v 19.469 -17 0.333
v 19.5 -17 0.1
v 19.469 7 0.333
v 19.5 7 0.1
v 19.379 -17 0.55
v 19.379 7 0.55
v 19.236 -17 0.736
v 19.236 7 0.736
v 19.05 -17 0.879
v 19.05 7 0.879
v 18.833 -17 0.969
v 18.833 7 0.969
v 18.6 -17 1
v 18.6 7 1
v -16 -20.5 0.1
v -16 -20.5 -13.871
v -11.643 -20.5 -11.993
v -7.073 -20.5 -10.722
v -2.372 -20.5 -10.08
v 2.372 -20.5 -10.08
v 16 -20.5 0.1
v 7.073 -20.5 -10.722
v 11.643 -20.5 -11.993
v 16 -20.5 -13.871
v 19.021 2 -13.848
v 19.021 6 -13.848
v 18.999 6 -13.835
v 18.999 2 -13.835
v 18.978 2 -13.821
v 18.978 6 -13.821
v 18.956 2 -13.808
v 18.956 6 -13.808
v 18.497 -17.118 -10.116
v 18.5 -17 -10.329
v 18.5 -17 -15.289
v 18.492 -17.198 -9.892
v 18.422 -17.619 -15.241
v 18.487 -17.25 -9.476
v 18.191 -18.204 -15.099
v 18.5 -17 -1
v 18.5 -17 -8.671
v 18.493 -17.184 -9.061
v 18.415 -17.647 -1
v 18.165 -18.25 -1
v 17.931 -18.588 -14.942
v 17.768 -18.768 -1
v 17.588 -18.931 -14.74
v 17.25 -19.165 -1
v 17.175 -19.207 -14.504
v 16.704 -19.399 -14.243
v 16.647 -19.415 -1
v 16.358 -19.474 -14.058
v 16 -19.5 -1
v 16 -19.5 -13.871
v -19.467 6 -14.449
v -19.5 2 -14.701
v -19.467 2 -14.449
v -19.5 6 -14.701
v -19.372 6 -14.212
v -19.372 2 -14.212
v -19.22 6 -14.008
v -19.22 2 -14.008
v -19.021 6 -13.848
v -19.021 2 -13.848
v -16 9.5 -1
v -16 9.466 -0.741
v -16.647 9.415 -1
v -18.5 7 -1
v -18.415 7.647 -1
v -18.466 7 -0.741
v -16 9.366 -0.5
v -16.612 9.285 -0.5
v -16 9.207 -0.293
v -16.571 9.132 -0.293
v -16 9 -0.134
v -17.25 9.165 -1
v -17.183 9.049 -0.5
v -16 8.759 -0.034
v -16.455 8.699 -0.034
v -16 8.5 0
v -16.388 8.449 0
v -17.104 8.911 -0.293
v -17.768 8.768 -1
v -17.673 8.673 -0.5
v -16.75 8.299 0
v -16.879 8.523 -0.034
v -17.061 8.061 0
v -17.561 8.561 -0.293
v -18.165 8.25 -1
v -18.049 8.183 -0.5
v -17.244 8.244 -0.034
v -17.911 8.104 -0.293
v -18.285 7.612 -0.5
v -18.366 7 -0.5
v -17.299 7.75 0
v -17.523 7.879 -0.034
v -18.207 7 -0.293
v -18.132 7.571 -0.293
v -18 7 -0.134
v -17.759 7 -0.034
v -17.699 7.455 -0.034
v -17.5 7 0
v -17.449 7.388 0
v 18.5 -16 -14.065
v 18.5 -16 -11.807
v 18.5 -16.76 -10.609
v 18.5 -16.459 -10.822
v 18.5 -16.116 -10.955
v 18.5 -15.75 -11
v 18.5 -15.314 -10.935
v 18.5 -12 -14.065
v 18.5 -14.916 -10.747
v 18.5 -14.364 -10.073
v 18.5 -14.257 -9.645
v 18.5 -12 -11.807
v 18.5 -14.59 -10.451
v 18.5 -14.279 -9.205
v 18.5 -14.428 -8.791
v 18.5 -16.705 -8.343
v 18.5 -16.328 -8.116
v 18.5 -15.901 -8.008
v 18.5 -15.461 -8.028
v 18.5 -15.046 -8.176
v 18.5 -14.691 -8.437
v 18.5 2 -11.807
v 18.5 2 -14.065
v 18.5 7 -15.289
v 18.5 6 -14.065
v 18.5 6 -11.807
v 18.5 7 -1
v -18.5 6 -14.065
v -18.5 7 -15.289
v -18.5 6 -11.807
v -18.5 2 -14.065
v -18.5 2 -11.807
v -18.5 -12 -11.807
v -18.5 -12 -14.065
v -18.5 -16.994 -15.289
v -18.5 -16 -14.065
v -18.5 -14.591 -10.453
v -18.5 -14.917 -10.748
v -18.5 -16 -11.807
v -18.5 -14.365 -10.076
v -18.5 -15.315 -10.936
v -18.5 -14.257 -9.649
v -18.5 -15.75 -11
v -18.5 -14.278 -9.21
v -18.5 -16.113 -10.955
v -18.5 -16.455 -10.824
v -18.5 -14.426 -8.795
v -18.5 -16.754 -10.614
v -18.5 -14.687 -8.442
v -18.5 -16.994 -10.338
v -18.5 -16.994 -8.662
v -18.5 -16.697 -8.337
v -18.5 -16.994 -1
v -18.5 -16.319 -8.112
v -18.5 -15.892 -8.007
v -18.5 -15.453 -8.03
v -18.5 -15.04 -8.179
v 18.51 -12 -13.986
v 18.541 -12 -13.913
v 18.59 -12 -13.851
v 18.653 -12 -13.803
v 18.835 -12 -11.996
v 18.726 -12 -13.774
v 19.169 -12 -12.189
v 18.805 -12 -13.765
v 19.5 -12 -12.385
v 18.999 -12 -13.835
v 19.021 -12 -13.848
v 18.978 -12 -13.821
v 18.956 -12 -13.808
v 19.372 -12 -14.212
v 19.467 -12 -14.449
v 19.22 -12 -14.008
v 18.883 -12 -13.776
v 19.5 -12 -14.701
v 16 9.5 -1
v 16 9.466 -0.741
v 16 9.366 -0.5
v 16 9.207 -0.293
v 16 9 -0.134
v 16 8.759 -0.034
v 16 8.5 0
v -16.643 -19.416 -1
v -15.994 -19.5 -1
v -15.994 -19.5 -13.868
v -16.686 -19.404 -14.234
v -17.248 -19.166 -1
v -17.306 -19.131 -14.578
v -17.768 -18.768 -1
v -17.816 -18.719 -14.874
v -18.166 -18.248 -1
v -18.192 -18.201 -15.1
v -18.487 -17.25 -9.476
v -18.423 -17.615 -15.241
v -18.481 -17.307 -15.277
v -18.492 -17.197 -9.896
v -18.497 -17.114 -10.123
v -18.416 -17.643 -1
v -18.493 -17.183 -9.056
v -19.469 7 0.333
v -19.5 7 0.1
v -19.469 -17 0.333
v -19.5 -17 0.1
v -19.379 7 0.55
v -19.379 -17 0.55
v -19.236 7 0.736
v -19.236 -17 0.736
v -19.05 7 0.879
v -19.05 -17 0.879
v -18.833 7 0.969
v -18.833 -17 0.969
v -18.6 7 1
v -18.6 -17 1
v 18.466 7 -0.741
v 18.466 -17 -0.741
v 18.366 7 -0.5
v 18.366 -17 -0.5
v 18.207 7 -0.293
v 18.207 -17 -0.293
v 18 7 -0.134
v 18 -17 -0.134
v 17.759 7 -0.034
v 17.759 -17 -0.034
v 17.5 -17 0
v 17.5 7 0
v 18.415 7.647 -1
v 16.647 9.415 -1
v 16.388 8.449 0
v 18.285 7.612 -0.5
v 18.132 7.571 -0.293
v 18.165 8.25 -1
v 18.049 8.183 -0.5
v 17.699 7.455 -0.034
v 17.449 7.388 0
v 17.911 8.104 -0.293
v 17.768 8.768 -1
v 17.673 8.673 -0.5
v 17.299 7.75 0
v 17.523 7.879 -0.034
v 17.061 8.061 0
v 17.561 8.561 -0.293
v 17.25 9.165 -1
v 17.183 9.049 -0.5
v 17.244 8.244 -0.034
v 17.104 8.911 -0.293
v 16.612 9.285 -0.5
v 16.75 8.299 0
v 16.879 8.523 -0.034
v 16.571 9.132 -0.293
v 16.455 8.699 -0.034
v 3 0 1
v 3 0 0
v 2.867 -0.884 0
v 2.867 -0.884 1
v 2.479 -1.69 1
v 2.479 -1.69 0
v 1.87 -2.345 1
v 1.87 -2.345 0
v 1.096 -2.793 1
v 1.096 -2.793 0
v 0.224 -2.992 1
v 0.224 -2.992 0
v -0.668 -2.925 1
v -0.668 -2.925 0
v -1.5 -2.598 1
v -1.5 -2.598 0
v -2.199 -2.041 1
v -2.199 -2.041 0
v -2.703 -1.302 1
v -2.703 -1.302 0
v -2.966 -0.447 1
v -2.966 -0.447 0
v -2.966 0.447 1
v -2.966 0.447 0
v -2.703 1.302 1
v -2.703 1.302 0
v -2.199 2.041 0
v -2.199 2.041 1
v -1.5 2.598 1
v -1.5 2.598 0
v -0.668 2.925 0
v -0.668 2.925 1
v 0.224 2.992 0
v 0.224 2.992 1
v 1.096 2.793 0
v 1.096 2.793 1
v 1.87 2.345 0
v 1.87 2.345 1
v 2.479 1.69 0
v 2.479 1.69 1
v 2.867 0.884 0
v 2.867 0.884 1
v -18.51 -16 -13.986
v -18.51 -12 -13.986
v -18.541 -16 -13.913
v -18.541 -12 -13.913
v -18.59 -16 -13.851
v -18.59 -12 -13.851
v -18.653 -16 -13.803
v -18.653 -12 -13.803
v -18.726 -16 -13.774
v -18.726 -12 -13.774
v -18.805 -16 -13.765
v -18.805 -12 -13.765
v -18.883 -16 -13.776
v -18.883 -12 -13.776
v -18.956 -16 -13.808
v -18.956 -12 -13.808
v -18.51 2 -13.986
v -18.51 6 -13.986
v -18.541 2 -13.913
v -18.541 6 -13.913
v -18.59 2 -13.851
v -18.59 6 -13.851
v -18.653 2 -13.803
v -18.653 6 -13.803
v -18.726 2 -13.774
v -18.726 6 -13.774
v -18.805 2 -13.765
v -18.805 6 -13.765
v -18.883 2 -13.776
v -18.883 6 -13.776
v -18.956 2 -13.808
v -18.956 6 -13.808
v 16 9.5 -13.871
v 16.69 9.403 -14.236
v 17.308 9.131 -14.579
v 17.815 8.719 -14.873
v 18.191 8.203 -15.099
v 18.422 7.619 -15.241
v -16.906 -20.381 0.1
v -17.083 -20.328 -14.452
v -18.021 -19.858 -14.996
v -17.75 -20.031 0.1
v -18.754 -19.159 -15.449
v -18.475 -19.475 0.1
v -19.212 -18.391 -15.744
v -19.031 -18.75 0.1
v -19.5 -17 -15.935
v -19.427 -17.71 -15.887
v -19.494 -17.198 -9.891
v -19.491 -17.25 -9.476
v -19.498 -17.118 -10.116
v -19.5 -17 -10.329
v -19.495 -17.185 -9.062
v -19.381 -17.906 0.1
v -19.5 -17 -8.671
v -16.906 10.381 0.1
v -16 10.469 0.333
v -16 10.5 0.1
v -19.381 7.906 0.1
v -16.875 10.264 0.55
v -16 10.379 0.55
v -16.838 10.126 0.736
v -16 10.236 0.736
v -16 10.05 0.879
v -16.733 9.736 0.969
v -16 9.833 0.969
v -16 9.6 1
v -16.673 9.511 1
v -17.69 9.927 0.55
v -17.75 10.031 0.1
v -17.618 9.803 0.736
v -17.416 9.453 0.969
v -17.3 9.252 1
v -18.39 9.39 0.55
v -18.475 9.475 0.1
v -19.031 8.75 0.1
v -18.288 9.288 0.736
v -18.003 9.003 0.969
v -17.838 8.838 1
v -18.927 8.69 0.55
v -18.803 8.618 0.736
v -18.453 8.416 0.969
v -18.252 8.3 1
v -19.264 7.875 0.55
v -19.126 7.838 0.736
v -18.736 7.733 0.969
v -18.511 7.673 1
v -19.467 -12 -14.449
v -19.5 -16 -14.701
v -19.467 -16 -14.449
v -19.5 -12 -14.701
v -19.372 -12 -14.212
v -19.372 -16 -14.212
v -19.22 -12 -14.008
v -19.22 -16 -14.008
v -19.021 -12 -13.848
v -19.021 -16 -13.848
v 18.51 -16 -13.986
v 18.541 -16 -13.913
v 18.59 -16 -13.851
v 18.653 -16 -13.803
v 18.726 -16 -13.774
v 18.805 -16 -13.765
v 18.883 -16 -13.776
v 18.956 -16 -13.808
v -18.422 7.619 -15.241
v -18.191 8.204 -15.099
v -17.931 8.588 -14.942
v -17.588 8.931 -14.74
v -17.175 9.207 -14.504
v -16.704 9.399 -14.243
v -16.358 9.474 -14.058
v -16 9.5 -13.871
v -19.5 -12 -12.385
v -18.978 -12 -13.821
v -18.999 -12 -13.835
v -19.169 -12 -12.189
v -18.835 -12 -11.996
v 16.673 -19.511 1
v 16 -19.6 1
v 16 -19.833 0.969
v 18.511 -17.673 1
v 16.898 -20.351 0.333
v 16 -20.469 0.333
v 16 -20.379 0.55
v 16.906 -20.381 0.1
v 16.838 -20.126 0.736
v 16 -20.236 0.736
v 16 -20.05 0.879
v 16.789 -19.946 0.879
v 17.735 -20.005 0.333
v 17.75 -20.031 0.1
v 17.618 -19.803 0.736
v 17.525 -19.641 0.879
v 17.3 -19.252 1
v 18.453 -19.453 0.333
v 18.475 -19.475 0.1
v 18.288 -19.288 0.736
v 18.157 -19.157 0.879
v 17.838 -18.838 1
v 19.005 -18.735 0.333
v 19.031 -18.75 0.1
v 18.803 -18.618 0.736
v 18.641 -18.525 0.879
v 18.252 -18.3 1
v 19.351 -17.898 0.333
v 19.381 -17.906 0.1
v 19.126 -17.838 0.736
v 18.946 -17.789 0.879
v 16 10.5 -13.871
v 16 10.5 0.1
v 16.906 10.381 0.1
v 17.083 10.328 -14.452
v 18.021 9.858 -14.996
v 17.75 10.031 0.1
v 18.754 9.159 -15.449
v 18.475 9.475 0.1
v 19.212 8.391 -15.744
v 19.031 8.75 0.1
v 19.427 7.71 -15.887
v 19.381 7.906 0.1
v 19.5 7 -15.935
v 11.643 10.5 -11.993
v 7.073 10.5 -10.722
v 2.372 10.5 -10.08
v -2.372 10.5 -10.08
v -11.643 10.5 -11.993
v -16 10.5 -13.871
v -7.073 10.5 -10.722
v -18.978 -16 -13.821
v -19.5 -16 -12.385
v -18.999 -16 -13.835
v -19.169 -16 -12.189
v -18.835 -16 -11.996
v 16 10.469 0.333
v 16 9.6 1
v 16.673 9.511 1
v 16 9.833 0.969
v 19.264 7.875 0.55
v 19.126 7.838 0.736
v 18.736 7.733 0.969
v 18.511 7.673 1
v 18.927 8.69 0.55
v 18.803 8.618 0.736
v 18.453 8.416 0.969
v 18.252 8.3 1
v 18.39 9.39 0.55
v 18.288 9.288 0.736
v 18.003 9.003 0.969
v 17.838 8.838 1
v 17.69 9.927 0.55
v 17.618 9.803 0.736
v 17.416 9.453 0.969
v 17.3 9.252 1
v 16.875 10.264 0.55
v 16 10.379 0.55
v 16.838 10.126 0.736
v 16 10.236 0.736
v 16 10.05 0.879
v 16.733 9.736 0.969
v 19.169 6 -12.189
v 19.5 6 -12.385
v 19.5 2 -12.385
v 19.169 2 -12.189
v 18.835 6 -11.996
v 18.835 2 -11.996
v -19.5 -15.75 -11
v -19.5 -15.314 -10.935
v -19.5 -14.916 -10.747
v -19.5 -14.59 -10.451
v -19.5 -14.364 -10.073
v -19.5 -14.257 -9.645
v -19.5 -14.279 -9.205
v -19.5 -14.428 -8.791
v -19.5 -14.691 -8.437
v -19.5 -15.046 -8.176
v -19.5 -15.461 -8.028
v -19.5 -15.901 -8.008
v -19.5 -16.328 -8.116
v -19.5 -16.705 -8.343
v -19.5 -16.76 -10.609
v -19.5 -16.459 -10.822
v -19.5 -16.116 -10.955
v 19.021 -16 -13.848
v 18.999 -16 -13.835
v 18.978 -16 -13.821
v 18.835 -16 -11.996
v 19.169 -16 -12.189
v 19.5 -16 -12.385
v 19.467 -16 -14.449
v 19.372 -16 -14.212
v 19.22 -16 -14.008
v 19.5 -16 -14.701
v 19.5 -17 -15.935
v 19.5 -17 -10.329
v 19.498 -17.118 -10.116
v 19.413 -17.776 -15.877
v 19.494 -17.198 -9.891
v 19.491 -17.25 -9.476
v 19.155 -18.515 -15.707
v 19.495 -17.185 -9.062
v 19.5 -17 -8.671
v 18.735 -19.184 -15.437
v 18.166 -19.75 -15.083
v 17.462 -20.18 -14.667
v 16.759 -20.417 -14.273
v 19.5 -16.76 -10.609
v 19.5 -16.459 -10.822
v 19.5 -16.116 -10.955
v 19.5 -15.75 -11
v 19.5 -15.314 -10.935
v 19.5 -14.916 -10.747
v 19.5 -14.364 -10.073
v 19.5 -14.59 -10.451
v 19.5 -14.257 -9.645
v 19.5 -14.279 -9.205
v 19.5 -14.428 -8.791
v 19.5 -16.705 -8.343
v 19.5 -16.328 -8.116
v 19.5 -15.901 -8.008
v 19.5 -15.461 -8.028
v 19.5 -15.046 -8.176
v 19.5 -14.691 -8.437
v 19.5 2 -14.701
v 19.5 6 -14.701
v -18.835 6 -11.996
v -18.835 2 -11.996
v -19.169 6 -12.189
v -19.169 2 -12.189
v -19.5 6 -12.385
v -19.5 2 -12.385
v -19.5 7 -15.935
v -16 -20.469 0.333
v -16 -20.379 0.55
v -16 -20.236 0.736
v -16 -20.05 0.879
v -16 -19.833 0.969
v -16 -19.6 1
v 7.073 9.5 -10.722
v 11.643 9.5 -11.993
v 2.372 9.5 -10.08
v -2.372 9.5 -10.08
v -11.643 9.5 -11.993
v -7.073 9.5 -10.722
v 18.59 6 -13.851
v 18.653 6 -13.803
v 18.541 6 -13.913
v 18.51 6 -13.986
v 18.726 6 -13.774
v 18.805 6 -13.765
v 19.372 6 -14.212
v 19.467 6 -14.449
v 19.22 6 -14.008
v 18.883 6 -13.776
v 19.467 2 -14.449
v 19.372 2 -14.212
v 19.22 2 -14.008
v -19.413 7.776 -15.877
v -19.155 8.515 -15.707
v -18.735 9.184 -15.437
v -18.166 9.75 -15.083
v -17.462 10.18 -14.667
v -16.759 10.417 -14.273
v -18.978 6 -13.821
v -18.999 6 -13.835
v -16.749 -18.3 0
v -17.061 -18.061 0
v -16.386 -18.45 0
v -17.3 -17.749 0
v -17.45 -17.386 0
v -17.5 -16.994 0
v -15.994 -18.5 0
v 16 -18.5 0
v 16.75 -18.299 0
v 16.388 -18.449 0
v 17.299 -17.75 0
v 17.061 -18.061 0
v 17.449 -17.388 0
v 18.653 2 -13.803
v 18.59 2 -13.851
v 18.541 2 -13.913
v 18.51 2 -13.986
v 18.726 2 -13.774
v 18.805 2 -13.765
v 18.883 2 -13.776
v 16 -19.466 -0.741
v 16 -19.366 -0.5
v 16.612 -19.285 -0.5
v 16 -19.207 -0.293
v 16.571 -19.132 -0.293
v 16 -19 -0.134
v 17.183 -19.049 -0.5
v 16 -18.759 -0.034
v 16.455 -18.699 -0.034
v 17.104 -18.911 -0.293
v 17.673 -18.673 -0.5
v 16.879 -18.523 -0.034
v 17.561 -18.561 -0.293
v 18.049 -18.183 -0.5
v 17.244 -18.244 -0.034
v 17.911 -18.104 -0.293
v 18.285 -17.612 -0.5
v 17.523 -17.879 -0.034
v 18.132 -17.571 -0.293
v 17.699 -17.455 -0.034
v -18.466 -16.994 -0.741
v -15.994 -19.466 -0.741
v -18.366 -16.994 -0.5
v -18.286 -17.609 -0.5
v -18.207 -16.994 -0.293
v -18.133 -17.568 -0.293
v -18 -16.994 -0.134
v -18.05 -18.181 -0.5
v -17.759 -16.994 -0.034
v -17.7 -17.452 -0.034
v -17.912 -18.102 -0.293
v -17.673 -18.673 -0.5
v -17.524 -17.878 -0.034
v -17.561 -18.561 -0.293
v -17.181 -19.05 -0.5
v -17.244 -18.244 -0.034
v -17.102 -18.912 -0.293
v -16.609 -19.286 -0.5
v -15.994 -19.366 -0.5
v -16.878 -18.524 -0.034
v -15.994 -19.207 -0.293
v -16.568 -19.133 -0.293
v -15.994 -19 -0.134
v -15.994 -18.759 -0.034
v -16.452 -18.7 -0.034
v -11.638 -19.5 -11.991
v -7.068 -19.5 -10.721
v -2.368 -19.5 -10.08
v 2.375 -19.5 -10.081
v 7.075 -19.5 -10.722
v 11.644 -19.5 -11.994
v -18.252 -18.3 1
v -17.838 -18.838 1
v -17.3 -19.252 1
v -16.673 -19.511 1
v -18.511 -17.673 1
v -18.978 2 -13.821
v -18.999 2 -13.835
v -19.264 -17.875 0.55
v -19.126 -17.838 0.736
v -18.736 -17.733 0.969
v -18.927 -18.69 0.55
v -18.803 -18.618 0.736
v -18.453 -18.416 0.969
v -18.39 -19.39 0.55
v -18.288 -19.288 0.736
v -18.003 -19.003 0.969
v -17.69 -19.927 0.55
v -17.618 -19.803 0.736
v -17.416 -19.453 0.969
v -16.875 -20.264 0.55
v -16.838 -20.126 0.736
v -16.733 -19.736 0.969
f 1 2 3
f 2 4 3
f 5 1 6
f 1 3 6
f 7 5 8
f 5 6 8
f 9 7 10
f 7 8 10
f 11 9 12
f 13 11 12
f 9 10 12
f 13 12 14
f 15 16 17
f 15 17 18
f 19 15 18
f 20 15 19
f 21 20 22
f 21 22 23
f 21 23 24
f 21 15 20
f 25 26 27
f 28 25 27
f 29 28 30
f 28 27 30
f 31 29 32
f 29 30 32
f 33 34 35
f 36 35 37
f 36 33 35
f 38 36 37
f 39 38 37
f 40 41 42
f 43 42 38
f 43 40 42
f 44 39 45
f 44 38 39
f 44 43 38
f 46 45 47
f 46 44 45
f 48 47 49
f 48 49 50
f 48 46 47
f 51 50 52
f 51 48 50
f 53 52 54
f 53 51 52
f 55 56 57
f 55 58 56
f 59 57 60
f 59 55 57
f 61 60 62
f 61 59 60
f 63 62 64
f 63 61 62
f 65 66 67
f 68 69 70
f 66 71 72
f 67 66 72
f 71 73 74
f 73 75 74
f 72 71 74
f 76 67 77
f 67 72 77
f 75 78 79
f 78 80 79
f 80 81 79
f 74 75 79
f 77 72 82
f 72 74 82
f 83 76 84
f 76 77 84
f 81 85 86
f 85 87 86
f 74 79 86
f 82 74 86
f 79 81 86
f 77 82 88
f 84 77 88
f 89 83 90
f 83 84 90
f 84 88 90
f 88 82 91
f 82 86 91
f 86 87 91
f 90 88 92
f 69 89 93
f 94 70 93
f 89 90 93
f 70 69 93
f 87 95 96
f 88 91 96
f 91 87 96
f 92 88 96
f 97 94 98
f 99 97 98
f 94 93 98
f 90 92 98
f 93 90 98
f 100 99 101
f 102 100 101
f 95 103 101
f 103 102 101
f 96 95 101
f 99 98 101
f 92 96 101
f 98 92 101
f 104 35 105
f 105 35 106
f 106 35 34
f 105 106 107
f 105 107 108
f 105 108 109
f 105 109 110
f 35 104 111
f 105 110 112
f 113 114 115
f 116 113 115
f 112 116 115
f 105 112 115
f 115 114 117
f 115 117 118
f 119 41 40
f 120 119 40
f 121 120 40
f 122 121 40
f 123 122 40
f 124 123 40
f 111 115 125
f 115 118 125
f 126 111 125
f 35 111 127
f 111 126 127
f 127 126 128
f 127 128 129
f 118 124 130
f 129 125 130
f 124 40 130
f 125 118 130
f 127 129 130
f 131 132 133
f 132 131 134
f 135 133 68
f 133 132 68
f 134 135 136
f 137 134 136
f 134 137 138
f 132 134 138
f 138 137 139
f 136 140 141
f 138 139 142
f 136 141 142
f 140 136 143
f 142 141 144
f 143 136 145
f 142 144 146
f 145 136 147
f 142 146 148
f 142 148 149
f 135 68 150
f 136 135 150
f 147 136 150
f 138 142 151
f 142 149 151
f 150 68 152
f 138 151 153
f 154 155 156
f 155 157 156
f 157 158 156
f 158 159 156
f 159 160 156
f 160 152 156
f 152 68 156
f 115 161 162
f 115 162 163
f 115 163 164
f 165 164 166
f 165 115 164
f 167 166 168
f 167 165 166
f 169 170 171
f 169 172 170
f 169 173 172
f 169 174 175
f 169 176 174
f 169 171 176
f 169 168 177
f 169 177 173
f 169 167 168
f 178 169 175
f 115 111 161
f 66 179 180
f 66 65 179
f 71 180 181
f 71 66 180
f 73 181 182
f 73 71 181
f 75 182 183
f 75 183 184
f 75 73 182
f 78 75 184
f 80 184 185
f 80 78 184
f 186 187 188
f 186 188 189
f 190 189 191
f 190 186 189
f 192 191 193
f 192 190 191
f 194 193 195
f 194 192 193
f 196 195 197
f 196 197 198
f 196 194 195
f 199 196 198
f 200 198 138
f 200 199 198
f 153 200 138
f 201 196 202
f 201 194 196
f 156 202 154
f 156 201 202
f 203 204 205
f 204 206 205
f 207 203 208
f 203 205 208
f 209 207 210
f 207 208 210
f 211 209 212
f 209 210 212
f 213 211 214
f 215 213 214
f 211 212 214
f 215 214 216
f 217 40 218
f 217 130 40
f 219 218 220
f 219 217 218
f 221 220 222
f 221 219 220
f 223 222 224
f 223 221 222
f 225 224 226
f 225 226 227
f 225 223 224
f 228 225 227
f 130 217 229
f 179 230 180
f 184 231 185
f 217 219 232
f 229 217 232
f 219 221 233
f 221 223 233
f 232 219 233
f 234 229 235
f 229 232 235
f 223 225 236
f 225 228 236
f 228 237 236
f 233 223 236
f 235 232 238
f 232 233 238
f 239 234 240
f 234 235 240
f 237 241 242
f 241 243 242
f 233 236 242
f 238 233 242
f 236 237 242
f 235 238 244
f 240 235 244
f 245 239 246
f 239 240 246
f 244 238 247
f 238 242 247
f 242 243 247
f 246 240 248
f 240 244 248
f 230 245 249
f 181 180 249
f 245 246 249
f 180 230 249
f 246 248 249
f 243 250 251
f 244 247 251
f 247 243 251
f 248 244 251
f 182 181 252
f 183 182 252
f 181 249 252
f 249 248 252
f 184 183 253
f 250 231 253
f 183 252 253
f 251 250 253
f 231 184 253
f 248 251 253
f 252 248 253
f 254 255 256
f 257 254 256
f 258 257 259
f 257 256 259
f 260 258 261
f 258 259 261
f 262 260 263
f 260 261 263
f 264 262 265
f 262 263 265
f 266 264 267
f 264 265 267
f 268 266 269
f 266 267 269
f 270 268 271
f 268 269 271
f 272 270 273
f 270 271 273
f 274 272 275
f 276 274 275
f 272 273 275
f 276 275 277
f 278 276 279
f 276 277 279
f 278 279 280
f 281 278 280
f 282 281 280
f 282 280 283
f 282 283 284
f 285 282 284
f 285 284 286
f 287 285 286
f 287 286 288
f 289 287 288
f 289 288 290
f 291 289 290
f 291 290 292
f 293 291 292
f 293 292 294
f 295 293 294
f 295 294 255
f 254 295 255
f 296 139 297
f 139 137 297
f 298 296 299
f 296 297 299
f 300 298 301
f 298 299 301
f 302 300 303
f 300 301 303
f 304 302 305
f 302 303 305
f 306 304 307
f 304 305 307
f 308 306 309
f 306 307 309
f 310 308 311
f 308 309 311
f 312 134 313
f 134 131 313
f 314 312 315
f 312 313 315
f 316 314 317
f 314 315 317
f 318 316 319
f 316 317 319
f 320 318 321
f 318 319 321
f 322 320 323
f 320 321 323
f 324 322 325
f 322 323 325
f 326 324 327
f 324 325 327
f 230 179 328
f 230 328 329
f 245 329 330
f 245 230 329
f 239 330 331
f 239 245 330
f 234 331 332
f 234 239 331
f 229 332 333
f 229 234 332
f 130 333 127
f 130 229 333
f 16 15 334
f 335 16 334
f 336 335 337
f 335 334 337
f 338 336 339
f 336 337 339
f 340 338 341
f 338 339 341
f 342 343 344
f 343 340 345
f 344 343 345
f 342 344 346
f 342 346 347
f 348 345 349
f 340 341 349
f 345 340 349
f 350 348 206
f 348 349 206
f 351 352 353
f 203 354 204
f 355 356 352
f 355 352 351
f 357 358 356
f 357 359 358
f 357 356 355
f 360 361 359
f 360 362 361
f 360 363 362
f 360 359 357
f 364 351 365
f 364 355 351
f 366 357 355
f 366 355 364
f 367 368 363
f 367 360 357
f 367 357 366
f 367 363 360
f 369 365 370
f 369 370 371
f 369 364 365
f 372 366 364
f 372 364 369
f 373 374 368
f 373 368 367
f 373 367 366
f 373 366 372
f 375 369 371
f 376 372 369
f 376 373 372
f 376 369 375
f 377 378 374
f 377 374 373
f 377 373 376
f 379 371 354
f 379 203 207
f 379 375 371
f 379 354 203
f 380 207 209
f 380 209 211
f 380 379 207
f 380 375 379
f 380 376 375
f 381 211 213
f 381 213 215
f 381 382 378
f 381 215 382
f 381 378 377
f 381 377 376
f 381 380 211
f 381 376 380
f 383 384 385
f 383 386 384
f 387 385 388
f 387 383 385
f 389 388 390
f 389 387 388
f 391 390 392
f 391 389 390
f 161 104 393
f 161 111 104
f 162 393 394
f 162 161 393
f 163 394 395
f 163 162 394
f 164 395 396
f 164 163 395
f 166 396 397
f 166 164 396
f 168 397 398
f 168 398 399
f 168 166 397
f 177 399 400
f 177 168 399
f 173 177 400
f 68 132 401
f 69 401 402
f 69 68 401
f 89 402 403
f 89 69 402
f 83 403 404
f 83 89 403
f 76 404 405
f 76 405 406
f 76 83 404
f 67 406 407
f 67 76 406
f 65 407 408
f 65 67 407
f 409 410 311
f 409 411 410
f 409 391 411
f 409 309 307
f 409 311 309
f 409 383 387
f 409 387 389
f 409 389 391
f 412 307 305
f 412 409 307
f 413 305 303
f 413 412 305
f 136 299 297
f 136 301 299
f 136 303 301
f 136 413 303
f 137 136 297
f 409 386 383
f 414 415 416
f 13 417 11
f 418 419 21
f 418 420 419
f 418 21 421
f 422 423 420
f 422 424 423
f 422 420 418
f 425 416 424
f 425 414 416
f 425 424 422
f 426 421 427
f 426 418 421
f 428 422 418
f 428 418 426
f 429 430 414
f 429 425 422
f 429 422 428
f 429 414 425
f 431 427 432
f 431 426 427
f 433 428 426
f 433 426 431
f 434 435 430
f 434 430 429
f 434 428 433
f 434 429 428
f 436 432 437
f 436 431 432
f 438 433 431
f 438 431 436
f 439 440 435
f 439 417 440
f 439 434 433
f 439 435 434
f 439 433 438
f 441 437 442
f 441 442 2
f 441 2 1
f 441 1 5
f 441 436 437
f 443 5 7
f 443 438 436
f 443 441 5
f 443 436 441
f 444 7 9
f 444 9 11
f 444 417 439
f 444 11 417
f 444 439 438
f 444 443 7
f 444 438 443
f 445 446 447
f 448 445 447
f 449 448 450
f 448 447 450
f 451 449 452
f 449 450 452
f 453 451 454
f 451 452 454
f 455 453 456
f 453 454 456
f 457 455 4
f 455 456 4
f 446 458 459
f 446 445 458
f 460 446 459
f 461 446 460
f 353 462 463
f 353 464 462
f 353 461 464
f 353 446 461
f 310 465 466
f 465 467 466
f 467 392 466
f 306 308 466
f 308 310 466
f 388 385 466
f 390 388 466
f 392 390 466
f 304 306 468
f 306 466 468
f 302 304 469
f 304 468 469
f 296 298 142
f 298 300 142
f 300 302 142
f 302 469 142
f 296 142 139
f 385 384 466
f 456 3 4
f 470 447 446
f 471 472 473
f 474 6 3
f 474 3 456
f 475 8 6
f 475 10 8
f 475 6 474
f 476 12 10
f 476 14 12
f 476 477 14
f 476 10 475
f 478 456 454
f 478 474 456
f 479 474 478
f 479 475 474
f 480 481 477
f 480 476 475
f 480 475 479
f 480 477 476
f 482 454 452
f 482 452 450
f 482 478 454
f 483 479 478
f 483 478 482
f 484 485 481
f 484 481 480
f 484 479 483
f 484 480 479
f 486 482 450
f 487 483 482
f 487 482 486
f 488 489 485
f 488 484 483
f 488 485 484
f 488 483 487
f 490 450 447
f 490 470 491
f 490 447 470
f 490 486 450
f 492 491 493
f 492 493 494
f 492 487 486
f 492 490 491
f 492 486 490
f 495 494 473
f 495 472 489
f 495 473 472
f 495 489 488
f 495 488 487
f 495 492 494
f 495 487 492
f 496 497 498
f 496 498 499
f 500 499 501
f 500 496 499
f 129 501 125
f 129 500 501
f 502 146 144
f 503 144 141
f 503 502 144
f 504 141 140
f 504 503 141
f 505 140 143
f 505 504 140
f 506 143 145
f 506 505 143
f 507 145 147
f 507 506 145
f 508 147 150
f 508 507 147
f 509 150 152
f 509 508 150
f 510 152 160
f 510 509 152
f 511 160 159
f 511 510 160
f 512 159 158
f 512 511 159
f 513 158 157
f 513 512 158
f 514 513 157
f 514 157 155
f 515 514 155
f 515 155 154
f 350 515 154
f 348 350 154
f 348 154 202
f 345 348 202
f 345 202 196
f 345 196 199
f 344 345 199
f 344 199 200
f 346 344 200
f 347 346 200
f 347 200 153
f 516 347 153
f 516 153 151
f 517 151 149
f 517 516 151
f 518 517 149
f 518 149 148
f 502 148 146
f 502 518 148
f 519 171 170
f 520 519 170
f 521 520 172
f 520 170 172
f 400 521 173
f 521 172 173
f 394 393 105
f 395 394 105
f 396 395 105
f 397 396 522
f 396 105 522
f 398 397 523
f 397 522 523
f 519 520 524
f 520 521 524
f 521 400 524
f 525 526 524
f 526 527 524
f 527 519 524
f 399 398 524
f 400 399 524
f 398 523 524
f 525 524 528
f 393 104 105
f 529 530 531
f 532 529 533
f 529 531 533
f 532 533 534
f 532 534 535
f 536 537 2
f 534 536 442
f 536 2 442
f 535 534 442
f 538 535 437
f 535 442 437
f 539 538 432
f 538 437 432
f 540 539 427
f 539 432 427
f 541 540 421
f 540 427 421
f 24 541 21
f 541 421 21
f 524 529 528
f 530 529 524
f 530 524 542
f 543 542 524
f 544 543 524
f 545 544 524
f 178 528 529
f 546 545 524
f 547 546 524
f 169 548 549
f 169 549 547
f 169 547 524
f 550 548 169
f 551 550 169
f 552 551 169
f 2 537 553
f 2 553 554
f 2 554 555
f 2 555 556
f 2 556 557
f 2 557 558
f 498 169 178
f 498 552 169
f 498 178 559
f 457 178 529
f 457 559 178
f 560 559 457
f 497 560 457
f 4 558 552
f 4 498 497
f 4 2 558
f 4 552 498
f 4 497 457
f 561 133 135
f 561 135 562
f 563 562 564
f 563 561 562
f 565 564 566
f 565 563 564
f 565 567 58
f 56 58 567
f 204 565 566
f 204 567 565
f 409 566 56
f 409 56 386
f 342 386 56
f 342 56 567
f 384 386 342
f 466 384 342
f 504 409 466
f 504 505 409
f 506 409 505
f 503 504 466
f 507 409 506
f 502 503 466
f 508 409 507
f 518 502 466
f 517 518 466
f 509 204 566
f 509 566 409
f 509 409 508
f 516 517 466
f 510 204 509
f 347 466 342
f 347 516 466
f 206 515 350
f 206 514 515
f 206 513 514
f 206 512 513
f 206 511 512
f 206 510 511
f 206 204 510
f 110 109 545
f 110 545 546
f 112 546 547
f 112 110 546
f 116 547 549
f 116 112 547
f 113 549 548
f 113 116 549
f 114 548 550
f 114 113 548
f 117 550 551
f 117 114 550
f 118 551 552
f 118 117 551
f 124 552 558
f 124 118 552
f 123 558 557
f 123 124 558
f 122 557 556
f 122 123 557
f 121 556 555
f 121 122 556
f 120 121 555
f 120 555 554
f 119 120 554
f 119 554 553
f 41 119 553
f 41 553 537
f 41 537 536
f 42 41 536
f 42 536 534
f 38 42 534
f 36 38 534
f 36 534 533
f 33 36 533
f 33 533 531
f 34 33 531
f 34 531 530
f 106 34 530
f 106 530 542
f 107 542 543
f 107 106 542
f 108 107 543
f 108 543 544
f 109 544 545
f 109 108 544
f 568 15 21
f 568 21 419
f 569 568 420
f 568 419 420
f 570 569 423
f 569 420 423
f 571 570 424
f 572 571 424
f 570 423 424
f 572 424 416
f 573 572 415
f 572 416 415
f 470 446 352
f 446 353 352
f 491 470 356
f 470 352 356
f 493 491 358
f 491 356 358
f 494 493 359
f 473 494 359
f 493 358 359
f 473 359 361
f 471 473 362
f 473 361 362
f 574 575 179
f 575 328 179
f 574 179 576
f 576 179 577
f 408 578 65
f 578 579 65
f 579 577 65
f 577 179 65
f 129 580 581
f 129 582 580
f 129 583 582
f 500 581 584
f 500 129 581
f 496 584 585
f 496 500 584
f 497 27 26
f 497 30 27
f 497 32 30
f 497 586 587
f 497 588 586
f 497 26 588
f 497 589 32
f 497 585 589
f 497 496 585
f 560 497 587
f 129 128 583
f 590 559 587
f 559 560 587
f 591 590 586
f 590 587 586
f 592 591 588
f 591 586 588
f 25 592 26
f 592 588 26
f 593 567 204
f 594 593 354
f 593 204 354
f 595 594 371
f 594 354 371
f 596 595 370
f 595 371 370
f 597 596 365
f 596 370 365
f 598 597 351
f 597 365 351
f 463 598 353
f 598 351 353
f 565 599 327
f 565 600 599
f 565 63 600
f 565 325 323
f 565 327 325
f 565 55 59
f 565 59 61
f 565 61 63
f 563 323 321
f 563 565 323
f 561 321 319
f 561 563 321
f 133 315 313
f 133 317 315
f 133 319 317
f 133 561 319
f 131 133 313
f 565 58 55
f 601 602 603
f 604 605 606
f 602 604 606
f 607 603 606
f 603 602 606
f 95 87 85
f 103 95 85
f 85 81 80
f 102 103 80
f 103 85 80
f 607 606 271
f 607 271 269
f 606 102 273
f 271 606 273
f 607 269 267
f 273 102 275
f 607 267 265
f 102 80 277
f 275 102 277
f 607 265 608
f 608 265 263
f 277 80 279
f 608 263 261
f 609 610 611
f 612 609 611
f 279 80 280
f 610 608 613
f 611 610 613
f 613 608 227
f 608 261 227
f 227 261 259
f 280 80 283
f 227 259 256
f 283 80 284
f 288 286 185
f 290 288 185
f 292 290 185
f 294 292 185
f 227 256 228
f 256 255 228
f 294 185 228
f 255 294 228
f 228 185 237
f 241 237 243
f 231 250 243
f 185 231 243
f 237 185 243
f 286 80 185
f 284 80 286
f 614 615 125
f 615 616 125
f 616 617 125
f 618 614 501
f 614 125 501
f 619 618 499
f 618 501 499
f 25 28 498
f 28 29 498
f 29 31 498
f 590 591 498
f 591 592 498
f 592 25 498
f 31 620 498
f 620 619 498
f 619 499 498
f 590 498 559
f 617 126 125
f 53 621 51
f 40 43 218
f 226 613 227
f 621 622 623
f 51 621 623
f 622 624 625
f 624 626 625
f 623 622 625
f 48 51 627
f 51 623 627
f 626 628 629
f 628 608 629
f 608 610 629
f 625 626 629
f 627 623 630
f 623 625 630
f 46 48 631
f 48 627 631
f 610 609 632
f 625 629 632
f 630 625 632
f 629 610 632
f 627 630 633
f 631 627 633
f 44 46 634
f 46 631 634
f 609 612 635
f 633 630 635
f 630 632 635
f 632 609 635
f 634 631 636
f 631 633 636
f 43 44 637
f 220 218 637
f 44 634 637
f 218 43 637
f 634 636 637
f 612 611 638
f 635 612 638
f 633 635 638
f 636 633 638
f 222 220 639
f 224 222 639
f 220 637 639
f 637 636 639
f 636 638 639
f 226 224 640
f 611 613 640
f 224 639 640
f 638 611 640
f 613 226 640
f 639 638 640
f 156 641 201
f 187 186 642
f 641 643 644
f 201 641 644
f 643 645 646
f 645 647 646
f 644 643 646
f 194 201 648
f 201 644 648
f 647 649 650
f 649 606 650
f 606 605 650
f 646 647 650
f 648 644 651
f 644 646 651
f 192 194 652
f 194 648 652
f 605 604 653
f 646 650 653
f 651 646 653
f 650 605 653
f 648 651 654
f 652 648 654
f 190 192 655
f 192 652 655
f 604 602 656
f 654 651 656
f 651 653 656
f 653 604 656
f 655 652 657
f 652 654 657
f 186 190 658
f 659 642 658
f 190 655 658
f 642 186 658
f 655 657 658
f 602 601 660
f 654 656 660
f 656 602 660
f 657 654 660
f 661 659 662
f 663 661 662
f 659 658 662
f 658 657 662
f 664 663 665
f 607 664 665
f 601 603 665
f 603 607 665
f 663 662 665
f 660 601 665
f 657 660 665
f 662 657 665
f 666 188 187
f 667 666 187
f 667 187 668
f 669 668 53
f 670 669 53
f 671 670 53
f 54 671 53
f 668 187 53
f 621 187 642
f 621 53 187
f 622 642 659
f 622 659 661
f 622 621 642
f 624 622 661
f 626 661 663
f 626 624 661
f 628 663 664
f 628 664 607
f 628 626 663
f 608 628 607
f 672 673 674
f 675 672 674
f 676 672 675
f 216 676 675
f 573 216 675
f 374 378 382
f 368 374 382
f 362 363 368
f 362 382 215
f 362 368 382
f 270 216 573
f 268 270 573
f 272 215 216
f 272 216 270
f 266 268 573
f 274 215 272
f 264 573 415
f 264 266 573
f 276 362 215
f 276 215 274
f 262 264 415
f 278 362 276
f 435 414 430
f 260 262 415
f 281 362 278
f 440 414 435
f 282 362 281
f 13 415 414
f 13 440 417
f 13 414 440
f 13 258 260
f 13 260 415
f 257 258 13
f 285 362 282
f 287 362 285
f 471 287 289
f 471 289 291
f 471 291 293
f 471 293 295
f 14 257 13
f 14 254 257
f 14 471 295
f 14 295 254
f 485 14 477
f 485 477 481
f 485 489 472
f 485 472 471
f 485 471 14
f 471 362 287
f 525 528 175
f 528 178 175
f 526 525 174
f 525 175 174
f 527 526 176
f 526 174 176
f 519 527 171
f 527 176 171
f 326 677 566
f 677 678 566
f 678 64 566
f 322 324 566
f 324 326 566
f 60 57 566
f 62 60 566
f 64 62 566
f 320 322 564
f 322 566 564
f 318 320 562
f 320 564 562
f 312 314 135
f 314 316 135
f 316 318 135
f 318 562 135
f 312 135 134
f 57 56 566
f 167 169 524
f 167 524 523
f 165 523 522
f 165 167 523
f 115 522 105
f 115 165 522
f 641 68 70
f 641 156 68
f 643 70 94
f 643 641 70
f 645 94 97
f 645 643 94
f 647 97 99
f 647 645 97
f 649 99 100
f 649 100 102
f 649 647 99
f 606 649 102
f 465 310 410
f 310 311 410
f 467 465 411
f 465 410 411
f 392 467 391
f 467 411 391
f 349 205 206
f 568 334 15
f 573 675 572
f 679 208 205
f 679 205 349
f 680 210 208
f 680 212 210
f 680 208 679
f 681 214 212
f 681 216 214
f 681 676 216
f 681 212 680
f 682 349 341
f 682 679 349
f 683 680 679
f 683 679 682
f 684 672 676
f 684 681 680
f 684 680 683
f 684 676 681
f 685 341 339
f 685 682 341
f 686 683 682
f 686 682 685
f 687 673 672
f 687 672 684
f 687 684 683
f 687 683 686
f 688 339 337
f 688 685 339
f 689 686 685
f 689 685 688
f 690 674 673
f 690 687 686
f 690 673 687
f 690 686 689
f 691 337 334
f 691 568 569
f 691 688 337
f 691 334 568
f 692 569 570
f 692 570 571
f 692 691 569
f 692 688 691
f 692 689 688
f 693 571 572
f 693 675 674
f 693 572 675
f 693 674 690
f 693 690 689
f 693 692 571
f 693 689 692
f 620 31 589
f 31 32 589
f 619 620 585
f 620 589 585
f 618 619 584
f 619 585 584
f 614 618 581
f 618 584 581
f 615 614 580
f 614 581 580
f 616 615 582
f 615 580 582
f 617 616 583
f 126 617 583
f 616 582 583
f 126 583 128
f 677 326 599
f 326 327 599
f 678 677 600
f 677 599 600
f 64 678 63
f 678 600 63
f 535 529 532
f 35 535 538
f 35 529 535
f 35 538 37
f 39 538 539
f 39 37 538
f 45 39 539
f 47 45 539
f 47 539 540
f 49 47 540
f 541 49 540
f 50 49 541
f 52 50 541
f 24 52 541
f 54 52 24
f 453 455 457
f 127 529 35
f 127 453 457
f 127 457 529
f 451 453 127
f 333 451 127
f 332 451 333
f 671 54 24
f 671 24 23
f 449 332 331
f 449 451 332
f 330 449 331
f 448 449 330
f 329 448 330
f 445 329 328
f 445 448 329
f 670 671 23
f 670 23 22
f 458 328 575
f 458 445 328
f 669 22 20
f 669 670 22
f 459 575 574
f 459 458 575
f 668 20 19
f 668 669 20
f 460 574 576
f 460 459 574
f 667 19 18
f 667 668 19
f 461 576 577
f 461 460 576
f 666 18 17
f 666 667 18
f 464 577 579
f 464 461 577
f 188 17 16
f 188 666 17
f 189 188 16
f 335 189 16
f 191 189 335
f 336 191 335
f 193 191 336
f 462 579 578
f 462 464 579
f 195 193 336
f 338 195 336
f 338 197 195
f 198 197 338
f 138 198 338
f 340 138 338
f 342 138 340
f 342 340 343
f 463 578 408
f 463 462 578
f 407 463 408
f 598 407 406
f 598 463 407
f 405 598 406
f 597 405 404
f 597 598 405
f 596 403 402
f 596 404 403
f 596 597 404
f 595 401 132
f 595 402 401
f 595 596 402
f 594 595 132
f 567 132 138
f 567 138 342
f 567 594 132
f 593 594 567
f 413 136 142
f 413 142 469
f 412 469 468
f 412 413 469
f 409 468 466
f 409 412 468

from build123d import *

# Parameters (mm, degrees)
CYLINDER004_R     = 36.5
CYLINDER004_DEPTH = 4
CYLINDER005_R     = 38
CYLINDER005_DEPTH = 4
CYLINDER003_R     = 36.5
CYLINDER003_DEPTH = 4
CYLINDER002_R     = 38
CYLINDER002_DEPTH = 4
CYLINDER001_R     = 1.5
CYLINDER001_DEPTH = 40
CYLINDER_R        = 35
CYLINDER_DEPTH    = 35
PAD_DEPTH         = 1
SKETCH001_R       = 3
HOLE_DEPTH        = 25
PAD001_DEPTH      = 18
FILLET_1_R        = 1
FILLET_2_R        = 0.9
FILLET001_R       = 1
FILLET002_R       = 0.3


with BuildPart() as cylinder004:
    # Cylinder004 → Cylinder004 (new body)
    with BuildSketch(Plane(origin=(0, 0, -45), x_dir=(1, 0, 0), z_dir=(0, -1, 0))):
        Circle(CYLINDER004_R)
    extrude(amount=CYLINDER004_DEPTH)


with BuildPart() as cut003:
    # Cylinder005 → Cylinder005 (new body)
    with BuildSketch(Plane(origin=(0, 0, -45), x_dir=(1, 0, 0), z_dir=(0, -1, 0))):
        Circle(CYLINDER005_R)
    extrude(amount=CYLINDER005_DEPTH)

    # Cut003: cut Cylinder004
    add(cylinder004.part, mode=Mode.SUBTRACT)


with BuildPart() as cut003_1:
    # Cut003 placement: moved
    add(cut003.part.moved(Location((0, -12, 0))))


with BuildPart() as cylinder003:
    # Cylinder003 → Cylinder003 (new body)
    with BuildSketch(Plane(origin=(0, 0, -45), x_dir=(1, 0, 0), z_dir=(0, -1, 0))):
        Circle(CYLINDER003_R)
    extrude(amount=CYLINDER003_DEPTH)


with BuildPart() as fusion:
    # Cylinder002 → Cylinder002 (new body)
    with BuildSketch(Plane(origin=(0, 0, -45), x_dir=(1, 0, 0), z_dir=(0, -1, 0))):
        Circle(CYLINDER002_R)
    extrude(amount=CYLINDER002_DEPTH)

    # Cut002: cut Cylinder003
    add(cylinder003.part, mode=Mode.SUBTRACT)


with BuildPart() as fusion_1:
    # Cut002 placement: moved
    add(fusion.part.moved(Location((0, 6, 0))))

    # Fusion: union Cut003
    add(cut003_1.part)


with BuildPart() as cylinder001:
    # Cylinder001 → Cylinder001 (new body)
    with BuildSketch(Plane(origin=(-20, -15.75, -9.5), x_dir=(0, 0, -1), z_dir=(1, 0, 0))):
        Circle(CYLINDER001_R)
    extrude(amount=CYLINDER001_DEPTH)


with BuildPart() as cylinder:
    # Cylinder → Cylinder (new body)
    with BuildSketch(Plane(origin=(0, 12, -45), x_dir=(1, 0, 0), z_dir=(0, -1, 0))):
        Circle(CYLINDER_R)
    extrude(amount=CYLINDER_DEPTH)


with BuildPart() as fillet002:
    # Sketch → Pad (new body)
    with BuildSketch(Plane.XY):
        with BuildLine():
            ThreePointArc((-16, 10.5), (-18.474874, 9.474874), (-19.5, 7))
            Line((-19.5, 7), (-19.5, -17))
            ThreePointArc((-19.5, -17), (-18.474874, -19.474874), (-16, -20.5))
            Line((-16, -20.5), (15.999994, -20.5))
            ThreePointArc((15.999994, -20.5), (18.474872, -19.474876), (19.5, -17))
            Line((19.5, -17), (19.5, 7))
            ThreePointArc((19.5, 7), (18.474874, 9.474874), (16, 10.5))
            Line((16, 10.5), (-16, 10.5))
        make_face()
    extrude(amount=PAD_DEPTH)

    # Sketch001 (on Face9 of Pad) → Hole (cut)
    with BuildSketch(Plane(origin=(0, 0, 0), x_dir=(1, 0, 0), z_dir=(0, 0, -1))):
        Circle(SKETCH001_R)
    extrude(amount=-HOLE_DEPTH, mode=Mode.SUBTRACT)

    # Sketch002 (on Face4 of Hole) → Pad001 (join)
    with BuildSketch(Plane(origin=(0, 0, 0), x_dir=(1, 0, 0), z_dir=(0, 0, -1))):
        with BuildLine():
            Line((-16, 20.5), (15.999994, 20.5))
            ThreePointArc((19.5, 17), (18.474872, 19.474876), (15.999994, 20.5))
            Line((19.5, 17), (19.5, -7))
            ThreePointArc((16, -10.5), (18.474874, -9.474874), (19.5, -7))
            Line((16, -10.5), (-16, -10.5))
            ThreePointArc((-19.5, -7), (-18.474874, -9.474874), (-16, -10.5))
            Line((-19.5, -7), (-19.5, 17))
            ThreePointArc((-16, 20.5), (-18.474874, 19.474874), (-19.5, 17))
        make_face()
        with BuildLine():
            ThreePointArc((-18.5, -7), (-17.767767, -8.767767), (-16, -9.5))
            Line((16, -9.5), (-16, -9.5))
            ThreePointArc((16, -9.5), (17.767767, -8.767767), (18.5, -7))
            Line((18.5, 17), (18.5, -7))
            ThreePointArc((18.5, 17), (17.767767, 18.767767), (16, 19.5))
            Line((-15.993973, 19.5), (16, 19.5))
            ThreePointArc((-15.993973, 19.5), (-17.767772, 18.767772), (-18.5, 16.993973))
            Line((-18.5, -7), (-18.5, 16.993973))
        make_face(mode=Mode.SUBTRACT)
    extrude(amount=PAD001_DEPTH)

    # Cut: cut Cylinder
    add(cylinder.part, mode=Mode.SUBTRACT)

    # Cut001: cut Cylinder001
    add(cylinder001.part, mode=Mode.SUBTRACT)

    # Fillet 1
    fillet_1_edges = [fillet002.edges().sort_by_distance(p)[0] for p in [
        (0.003014, -19.5, 0),
    ]]
    fillet(fillet_1_edges, radius=FILLET_1_R)

    # Fillet 2
    fillet_2_edges = [fillet002.edges().sort_by_distance(p)[0] for p in [
        (19.5, -5, 1),
    ]]
    fillet(fillet_2_edges, radius=FILLET_2_R)

    # Cut004: cut Fusion
    add(fusion_1.part, mode=Mode.SUBTRACT)

    # Fillet001
    fillet001_edges = [fillet002.edges().sort_by_distance(p)[0] for p in [
        (-19.5, 4, -14.145503),
        (-19.5, -14, -14.145503),
        (19.5, -14, -14.145503),
        (19.5, 4, -14.145503),
    ]]
    fillet(fillet001_edges, radius=FILLET001_R)

    # Fillet002
    fillet002_edges = [fillet002.edges().sort_by_distance(p)[0] for p in [
        (-18.5, 4, -13.535735),
        (-18.5, -14, -13.535735),
        (18.5, -14, -13.535735),
        (18.5, 4, -13.535735),
    ]]
    fillet(fillet002_edges, radius=FILLET002_R)


solid = fillet002.part
